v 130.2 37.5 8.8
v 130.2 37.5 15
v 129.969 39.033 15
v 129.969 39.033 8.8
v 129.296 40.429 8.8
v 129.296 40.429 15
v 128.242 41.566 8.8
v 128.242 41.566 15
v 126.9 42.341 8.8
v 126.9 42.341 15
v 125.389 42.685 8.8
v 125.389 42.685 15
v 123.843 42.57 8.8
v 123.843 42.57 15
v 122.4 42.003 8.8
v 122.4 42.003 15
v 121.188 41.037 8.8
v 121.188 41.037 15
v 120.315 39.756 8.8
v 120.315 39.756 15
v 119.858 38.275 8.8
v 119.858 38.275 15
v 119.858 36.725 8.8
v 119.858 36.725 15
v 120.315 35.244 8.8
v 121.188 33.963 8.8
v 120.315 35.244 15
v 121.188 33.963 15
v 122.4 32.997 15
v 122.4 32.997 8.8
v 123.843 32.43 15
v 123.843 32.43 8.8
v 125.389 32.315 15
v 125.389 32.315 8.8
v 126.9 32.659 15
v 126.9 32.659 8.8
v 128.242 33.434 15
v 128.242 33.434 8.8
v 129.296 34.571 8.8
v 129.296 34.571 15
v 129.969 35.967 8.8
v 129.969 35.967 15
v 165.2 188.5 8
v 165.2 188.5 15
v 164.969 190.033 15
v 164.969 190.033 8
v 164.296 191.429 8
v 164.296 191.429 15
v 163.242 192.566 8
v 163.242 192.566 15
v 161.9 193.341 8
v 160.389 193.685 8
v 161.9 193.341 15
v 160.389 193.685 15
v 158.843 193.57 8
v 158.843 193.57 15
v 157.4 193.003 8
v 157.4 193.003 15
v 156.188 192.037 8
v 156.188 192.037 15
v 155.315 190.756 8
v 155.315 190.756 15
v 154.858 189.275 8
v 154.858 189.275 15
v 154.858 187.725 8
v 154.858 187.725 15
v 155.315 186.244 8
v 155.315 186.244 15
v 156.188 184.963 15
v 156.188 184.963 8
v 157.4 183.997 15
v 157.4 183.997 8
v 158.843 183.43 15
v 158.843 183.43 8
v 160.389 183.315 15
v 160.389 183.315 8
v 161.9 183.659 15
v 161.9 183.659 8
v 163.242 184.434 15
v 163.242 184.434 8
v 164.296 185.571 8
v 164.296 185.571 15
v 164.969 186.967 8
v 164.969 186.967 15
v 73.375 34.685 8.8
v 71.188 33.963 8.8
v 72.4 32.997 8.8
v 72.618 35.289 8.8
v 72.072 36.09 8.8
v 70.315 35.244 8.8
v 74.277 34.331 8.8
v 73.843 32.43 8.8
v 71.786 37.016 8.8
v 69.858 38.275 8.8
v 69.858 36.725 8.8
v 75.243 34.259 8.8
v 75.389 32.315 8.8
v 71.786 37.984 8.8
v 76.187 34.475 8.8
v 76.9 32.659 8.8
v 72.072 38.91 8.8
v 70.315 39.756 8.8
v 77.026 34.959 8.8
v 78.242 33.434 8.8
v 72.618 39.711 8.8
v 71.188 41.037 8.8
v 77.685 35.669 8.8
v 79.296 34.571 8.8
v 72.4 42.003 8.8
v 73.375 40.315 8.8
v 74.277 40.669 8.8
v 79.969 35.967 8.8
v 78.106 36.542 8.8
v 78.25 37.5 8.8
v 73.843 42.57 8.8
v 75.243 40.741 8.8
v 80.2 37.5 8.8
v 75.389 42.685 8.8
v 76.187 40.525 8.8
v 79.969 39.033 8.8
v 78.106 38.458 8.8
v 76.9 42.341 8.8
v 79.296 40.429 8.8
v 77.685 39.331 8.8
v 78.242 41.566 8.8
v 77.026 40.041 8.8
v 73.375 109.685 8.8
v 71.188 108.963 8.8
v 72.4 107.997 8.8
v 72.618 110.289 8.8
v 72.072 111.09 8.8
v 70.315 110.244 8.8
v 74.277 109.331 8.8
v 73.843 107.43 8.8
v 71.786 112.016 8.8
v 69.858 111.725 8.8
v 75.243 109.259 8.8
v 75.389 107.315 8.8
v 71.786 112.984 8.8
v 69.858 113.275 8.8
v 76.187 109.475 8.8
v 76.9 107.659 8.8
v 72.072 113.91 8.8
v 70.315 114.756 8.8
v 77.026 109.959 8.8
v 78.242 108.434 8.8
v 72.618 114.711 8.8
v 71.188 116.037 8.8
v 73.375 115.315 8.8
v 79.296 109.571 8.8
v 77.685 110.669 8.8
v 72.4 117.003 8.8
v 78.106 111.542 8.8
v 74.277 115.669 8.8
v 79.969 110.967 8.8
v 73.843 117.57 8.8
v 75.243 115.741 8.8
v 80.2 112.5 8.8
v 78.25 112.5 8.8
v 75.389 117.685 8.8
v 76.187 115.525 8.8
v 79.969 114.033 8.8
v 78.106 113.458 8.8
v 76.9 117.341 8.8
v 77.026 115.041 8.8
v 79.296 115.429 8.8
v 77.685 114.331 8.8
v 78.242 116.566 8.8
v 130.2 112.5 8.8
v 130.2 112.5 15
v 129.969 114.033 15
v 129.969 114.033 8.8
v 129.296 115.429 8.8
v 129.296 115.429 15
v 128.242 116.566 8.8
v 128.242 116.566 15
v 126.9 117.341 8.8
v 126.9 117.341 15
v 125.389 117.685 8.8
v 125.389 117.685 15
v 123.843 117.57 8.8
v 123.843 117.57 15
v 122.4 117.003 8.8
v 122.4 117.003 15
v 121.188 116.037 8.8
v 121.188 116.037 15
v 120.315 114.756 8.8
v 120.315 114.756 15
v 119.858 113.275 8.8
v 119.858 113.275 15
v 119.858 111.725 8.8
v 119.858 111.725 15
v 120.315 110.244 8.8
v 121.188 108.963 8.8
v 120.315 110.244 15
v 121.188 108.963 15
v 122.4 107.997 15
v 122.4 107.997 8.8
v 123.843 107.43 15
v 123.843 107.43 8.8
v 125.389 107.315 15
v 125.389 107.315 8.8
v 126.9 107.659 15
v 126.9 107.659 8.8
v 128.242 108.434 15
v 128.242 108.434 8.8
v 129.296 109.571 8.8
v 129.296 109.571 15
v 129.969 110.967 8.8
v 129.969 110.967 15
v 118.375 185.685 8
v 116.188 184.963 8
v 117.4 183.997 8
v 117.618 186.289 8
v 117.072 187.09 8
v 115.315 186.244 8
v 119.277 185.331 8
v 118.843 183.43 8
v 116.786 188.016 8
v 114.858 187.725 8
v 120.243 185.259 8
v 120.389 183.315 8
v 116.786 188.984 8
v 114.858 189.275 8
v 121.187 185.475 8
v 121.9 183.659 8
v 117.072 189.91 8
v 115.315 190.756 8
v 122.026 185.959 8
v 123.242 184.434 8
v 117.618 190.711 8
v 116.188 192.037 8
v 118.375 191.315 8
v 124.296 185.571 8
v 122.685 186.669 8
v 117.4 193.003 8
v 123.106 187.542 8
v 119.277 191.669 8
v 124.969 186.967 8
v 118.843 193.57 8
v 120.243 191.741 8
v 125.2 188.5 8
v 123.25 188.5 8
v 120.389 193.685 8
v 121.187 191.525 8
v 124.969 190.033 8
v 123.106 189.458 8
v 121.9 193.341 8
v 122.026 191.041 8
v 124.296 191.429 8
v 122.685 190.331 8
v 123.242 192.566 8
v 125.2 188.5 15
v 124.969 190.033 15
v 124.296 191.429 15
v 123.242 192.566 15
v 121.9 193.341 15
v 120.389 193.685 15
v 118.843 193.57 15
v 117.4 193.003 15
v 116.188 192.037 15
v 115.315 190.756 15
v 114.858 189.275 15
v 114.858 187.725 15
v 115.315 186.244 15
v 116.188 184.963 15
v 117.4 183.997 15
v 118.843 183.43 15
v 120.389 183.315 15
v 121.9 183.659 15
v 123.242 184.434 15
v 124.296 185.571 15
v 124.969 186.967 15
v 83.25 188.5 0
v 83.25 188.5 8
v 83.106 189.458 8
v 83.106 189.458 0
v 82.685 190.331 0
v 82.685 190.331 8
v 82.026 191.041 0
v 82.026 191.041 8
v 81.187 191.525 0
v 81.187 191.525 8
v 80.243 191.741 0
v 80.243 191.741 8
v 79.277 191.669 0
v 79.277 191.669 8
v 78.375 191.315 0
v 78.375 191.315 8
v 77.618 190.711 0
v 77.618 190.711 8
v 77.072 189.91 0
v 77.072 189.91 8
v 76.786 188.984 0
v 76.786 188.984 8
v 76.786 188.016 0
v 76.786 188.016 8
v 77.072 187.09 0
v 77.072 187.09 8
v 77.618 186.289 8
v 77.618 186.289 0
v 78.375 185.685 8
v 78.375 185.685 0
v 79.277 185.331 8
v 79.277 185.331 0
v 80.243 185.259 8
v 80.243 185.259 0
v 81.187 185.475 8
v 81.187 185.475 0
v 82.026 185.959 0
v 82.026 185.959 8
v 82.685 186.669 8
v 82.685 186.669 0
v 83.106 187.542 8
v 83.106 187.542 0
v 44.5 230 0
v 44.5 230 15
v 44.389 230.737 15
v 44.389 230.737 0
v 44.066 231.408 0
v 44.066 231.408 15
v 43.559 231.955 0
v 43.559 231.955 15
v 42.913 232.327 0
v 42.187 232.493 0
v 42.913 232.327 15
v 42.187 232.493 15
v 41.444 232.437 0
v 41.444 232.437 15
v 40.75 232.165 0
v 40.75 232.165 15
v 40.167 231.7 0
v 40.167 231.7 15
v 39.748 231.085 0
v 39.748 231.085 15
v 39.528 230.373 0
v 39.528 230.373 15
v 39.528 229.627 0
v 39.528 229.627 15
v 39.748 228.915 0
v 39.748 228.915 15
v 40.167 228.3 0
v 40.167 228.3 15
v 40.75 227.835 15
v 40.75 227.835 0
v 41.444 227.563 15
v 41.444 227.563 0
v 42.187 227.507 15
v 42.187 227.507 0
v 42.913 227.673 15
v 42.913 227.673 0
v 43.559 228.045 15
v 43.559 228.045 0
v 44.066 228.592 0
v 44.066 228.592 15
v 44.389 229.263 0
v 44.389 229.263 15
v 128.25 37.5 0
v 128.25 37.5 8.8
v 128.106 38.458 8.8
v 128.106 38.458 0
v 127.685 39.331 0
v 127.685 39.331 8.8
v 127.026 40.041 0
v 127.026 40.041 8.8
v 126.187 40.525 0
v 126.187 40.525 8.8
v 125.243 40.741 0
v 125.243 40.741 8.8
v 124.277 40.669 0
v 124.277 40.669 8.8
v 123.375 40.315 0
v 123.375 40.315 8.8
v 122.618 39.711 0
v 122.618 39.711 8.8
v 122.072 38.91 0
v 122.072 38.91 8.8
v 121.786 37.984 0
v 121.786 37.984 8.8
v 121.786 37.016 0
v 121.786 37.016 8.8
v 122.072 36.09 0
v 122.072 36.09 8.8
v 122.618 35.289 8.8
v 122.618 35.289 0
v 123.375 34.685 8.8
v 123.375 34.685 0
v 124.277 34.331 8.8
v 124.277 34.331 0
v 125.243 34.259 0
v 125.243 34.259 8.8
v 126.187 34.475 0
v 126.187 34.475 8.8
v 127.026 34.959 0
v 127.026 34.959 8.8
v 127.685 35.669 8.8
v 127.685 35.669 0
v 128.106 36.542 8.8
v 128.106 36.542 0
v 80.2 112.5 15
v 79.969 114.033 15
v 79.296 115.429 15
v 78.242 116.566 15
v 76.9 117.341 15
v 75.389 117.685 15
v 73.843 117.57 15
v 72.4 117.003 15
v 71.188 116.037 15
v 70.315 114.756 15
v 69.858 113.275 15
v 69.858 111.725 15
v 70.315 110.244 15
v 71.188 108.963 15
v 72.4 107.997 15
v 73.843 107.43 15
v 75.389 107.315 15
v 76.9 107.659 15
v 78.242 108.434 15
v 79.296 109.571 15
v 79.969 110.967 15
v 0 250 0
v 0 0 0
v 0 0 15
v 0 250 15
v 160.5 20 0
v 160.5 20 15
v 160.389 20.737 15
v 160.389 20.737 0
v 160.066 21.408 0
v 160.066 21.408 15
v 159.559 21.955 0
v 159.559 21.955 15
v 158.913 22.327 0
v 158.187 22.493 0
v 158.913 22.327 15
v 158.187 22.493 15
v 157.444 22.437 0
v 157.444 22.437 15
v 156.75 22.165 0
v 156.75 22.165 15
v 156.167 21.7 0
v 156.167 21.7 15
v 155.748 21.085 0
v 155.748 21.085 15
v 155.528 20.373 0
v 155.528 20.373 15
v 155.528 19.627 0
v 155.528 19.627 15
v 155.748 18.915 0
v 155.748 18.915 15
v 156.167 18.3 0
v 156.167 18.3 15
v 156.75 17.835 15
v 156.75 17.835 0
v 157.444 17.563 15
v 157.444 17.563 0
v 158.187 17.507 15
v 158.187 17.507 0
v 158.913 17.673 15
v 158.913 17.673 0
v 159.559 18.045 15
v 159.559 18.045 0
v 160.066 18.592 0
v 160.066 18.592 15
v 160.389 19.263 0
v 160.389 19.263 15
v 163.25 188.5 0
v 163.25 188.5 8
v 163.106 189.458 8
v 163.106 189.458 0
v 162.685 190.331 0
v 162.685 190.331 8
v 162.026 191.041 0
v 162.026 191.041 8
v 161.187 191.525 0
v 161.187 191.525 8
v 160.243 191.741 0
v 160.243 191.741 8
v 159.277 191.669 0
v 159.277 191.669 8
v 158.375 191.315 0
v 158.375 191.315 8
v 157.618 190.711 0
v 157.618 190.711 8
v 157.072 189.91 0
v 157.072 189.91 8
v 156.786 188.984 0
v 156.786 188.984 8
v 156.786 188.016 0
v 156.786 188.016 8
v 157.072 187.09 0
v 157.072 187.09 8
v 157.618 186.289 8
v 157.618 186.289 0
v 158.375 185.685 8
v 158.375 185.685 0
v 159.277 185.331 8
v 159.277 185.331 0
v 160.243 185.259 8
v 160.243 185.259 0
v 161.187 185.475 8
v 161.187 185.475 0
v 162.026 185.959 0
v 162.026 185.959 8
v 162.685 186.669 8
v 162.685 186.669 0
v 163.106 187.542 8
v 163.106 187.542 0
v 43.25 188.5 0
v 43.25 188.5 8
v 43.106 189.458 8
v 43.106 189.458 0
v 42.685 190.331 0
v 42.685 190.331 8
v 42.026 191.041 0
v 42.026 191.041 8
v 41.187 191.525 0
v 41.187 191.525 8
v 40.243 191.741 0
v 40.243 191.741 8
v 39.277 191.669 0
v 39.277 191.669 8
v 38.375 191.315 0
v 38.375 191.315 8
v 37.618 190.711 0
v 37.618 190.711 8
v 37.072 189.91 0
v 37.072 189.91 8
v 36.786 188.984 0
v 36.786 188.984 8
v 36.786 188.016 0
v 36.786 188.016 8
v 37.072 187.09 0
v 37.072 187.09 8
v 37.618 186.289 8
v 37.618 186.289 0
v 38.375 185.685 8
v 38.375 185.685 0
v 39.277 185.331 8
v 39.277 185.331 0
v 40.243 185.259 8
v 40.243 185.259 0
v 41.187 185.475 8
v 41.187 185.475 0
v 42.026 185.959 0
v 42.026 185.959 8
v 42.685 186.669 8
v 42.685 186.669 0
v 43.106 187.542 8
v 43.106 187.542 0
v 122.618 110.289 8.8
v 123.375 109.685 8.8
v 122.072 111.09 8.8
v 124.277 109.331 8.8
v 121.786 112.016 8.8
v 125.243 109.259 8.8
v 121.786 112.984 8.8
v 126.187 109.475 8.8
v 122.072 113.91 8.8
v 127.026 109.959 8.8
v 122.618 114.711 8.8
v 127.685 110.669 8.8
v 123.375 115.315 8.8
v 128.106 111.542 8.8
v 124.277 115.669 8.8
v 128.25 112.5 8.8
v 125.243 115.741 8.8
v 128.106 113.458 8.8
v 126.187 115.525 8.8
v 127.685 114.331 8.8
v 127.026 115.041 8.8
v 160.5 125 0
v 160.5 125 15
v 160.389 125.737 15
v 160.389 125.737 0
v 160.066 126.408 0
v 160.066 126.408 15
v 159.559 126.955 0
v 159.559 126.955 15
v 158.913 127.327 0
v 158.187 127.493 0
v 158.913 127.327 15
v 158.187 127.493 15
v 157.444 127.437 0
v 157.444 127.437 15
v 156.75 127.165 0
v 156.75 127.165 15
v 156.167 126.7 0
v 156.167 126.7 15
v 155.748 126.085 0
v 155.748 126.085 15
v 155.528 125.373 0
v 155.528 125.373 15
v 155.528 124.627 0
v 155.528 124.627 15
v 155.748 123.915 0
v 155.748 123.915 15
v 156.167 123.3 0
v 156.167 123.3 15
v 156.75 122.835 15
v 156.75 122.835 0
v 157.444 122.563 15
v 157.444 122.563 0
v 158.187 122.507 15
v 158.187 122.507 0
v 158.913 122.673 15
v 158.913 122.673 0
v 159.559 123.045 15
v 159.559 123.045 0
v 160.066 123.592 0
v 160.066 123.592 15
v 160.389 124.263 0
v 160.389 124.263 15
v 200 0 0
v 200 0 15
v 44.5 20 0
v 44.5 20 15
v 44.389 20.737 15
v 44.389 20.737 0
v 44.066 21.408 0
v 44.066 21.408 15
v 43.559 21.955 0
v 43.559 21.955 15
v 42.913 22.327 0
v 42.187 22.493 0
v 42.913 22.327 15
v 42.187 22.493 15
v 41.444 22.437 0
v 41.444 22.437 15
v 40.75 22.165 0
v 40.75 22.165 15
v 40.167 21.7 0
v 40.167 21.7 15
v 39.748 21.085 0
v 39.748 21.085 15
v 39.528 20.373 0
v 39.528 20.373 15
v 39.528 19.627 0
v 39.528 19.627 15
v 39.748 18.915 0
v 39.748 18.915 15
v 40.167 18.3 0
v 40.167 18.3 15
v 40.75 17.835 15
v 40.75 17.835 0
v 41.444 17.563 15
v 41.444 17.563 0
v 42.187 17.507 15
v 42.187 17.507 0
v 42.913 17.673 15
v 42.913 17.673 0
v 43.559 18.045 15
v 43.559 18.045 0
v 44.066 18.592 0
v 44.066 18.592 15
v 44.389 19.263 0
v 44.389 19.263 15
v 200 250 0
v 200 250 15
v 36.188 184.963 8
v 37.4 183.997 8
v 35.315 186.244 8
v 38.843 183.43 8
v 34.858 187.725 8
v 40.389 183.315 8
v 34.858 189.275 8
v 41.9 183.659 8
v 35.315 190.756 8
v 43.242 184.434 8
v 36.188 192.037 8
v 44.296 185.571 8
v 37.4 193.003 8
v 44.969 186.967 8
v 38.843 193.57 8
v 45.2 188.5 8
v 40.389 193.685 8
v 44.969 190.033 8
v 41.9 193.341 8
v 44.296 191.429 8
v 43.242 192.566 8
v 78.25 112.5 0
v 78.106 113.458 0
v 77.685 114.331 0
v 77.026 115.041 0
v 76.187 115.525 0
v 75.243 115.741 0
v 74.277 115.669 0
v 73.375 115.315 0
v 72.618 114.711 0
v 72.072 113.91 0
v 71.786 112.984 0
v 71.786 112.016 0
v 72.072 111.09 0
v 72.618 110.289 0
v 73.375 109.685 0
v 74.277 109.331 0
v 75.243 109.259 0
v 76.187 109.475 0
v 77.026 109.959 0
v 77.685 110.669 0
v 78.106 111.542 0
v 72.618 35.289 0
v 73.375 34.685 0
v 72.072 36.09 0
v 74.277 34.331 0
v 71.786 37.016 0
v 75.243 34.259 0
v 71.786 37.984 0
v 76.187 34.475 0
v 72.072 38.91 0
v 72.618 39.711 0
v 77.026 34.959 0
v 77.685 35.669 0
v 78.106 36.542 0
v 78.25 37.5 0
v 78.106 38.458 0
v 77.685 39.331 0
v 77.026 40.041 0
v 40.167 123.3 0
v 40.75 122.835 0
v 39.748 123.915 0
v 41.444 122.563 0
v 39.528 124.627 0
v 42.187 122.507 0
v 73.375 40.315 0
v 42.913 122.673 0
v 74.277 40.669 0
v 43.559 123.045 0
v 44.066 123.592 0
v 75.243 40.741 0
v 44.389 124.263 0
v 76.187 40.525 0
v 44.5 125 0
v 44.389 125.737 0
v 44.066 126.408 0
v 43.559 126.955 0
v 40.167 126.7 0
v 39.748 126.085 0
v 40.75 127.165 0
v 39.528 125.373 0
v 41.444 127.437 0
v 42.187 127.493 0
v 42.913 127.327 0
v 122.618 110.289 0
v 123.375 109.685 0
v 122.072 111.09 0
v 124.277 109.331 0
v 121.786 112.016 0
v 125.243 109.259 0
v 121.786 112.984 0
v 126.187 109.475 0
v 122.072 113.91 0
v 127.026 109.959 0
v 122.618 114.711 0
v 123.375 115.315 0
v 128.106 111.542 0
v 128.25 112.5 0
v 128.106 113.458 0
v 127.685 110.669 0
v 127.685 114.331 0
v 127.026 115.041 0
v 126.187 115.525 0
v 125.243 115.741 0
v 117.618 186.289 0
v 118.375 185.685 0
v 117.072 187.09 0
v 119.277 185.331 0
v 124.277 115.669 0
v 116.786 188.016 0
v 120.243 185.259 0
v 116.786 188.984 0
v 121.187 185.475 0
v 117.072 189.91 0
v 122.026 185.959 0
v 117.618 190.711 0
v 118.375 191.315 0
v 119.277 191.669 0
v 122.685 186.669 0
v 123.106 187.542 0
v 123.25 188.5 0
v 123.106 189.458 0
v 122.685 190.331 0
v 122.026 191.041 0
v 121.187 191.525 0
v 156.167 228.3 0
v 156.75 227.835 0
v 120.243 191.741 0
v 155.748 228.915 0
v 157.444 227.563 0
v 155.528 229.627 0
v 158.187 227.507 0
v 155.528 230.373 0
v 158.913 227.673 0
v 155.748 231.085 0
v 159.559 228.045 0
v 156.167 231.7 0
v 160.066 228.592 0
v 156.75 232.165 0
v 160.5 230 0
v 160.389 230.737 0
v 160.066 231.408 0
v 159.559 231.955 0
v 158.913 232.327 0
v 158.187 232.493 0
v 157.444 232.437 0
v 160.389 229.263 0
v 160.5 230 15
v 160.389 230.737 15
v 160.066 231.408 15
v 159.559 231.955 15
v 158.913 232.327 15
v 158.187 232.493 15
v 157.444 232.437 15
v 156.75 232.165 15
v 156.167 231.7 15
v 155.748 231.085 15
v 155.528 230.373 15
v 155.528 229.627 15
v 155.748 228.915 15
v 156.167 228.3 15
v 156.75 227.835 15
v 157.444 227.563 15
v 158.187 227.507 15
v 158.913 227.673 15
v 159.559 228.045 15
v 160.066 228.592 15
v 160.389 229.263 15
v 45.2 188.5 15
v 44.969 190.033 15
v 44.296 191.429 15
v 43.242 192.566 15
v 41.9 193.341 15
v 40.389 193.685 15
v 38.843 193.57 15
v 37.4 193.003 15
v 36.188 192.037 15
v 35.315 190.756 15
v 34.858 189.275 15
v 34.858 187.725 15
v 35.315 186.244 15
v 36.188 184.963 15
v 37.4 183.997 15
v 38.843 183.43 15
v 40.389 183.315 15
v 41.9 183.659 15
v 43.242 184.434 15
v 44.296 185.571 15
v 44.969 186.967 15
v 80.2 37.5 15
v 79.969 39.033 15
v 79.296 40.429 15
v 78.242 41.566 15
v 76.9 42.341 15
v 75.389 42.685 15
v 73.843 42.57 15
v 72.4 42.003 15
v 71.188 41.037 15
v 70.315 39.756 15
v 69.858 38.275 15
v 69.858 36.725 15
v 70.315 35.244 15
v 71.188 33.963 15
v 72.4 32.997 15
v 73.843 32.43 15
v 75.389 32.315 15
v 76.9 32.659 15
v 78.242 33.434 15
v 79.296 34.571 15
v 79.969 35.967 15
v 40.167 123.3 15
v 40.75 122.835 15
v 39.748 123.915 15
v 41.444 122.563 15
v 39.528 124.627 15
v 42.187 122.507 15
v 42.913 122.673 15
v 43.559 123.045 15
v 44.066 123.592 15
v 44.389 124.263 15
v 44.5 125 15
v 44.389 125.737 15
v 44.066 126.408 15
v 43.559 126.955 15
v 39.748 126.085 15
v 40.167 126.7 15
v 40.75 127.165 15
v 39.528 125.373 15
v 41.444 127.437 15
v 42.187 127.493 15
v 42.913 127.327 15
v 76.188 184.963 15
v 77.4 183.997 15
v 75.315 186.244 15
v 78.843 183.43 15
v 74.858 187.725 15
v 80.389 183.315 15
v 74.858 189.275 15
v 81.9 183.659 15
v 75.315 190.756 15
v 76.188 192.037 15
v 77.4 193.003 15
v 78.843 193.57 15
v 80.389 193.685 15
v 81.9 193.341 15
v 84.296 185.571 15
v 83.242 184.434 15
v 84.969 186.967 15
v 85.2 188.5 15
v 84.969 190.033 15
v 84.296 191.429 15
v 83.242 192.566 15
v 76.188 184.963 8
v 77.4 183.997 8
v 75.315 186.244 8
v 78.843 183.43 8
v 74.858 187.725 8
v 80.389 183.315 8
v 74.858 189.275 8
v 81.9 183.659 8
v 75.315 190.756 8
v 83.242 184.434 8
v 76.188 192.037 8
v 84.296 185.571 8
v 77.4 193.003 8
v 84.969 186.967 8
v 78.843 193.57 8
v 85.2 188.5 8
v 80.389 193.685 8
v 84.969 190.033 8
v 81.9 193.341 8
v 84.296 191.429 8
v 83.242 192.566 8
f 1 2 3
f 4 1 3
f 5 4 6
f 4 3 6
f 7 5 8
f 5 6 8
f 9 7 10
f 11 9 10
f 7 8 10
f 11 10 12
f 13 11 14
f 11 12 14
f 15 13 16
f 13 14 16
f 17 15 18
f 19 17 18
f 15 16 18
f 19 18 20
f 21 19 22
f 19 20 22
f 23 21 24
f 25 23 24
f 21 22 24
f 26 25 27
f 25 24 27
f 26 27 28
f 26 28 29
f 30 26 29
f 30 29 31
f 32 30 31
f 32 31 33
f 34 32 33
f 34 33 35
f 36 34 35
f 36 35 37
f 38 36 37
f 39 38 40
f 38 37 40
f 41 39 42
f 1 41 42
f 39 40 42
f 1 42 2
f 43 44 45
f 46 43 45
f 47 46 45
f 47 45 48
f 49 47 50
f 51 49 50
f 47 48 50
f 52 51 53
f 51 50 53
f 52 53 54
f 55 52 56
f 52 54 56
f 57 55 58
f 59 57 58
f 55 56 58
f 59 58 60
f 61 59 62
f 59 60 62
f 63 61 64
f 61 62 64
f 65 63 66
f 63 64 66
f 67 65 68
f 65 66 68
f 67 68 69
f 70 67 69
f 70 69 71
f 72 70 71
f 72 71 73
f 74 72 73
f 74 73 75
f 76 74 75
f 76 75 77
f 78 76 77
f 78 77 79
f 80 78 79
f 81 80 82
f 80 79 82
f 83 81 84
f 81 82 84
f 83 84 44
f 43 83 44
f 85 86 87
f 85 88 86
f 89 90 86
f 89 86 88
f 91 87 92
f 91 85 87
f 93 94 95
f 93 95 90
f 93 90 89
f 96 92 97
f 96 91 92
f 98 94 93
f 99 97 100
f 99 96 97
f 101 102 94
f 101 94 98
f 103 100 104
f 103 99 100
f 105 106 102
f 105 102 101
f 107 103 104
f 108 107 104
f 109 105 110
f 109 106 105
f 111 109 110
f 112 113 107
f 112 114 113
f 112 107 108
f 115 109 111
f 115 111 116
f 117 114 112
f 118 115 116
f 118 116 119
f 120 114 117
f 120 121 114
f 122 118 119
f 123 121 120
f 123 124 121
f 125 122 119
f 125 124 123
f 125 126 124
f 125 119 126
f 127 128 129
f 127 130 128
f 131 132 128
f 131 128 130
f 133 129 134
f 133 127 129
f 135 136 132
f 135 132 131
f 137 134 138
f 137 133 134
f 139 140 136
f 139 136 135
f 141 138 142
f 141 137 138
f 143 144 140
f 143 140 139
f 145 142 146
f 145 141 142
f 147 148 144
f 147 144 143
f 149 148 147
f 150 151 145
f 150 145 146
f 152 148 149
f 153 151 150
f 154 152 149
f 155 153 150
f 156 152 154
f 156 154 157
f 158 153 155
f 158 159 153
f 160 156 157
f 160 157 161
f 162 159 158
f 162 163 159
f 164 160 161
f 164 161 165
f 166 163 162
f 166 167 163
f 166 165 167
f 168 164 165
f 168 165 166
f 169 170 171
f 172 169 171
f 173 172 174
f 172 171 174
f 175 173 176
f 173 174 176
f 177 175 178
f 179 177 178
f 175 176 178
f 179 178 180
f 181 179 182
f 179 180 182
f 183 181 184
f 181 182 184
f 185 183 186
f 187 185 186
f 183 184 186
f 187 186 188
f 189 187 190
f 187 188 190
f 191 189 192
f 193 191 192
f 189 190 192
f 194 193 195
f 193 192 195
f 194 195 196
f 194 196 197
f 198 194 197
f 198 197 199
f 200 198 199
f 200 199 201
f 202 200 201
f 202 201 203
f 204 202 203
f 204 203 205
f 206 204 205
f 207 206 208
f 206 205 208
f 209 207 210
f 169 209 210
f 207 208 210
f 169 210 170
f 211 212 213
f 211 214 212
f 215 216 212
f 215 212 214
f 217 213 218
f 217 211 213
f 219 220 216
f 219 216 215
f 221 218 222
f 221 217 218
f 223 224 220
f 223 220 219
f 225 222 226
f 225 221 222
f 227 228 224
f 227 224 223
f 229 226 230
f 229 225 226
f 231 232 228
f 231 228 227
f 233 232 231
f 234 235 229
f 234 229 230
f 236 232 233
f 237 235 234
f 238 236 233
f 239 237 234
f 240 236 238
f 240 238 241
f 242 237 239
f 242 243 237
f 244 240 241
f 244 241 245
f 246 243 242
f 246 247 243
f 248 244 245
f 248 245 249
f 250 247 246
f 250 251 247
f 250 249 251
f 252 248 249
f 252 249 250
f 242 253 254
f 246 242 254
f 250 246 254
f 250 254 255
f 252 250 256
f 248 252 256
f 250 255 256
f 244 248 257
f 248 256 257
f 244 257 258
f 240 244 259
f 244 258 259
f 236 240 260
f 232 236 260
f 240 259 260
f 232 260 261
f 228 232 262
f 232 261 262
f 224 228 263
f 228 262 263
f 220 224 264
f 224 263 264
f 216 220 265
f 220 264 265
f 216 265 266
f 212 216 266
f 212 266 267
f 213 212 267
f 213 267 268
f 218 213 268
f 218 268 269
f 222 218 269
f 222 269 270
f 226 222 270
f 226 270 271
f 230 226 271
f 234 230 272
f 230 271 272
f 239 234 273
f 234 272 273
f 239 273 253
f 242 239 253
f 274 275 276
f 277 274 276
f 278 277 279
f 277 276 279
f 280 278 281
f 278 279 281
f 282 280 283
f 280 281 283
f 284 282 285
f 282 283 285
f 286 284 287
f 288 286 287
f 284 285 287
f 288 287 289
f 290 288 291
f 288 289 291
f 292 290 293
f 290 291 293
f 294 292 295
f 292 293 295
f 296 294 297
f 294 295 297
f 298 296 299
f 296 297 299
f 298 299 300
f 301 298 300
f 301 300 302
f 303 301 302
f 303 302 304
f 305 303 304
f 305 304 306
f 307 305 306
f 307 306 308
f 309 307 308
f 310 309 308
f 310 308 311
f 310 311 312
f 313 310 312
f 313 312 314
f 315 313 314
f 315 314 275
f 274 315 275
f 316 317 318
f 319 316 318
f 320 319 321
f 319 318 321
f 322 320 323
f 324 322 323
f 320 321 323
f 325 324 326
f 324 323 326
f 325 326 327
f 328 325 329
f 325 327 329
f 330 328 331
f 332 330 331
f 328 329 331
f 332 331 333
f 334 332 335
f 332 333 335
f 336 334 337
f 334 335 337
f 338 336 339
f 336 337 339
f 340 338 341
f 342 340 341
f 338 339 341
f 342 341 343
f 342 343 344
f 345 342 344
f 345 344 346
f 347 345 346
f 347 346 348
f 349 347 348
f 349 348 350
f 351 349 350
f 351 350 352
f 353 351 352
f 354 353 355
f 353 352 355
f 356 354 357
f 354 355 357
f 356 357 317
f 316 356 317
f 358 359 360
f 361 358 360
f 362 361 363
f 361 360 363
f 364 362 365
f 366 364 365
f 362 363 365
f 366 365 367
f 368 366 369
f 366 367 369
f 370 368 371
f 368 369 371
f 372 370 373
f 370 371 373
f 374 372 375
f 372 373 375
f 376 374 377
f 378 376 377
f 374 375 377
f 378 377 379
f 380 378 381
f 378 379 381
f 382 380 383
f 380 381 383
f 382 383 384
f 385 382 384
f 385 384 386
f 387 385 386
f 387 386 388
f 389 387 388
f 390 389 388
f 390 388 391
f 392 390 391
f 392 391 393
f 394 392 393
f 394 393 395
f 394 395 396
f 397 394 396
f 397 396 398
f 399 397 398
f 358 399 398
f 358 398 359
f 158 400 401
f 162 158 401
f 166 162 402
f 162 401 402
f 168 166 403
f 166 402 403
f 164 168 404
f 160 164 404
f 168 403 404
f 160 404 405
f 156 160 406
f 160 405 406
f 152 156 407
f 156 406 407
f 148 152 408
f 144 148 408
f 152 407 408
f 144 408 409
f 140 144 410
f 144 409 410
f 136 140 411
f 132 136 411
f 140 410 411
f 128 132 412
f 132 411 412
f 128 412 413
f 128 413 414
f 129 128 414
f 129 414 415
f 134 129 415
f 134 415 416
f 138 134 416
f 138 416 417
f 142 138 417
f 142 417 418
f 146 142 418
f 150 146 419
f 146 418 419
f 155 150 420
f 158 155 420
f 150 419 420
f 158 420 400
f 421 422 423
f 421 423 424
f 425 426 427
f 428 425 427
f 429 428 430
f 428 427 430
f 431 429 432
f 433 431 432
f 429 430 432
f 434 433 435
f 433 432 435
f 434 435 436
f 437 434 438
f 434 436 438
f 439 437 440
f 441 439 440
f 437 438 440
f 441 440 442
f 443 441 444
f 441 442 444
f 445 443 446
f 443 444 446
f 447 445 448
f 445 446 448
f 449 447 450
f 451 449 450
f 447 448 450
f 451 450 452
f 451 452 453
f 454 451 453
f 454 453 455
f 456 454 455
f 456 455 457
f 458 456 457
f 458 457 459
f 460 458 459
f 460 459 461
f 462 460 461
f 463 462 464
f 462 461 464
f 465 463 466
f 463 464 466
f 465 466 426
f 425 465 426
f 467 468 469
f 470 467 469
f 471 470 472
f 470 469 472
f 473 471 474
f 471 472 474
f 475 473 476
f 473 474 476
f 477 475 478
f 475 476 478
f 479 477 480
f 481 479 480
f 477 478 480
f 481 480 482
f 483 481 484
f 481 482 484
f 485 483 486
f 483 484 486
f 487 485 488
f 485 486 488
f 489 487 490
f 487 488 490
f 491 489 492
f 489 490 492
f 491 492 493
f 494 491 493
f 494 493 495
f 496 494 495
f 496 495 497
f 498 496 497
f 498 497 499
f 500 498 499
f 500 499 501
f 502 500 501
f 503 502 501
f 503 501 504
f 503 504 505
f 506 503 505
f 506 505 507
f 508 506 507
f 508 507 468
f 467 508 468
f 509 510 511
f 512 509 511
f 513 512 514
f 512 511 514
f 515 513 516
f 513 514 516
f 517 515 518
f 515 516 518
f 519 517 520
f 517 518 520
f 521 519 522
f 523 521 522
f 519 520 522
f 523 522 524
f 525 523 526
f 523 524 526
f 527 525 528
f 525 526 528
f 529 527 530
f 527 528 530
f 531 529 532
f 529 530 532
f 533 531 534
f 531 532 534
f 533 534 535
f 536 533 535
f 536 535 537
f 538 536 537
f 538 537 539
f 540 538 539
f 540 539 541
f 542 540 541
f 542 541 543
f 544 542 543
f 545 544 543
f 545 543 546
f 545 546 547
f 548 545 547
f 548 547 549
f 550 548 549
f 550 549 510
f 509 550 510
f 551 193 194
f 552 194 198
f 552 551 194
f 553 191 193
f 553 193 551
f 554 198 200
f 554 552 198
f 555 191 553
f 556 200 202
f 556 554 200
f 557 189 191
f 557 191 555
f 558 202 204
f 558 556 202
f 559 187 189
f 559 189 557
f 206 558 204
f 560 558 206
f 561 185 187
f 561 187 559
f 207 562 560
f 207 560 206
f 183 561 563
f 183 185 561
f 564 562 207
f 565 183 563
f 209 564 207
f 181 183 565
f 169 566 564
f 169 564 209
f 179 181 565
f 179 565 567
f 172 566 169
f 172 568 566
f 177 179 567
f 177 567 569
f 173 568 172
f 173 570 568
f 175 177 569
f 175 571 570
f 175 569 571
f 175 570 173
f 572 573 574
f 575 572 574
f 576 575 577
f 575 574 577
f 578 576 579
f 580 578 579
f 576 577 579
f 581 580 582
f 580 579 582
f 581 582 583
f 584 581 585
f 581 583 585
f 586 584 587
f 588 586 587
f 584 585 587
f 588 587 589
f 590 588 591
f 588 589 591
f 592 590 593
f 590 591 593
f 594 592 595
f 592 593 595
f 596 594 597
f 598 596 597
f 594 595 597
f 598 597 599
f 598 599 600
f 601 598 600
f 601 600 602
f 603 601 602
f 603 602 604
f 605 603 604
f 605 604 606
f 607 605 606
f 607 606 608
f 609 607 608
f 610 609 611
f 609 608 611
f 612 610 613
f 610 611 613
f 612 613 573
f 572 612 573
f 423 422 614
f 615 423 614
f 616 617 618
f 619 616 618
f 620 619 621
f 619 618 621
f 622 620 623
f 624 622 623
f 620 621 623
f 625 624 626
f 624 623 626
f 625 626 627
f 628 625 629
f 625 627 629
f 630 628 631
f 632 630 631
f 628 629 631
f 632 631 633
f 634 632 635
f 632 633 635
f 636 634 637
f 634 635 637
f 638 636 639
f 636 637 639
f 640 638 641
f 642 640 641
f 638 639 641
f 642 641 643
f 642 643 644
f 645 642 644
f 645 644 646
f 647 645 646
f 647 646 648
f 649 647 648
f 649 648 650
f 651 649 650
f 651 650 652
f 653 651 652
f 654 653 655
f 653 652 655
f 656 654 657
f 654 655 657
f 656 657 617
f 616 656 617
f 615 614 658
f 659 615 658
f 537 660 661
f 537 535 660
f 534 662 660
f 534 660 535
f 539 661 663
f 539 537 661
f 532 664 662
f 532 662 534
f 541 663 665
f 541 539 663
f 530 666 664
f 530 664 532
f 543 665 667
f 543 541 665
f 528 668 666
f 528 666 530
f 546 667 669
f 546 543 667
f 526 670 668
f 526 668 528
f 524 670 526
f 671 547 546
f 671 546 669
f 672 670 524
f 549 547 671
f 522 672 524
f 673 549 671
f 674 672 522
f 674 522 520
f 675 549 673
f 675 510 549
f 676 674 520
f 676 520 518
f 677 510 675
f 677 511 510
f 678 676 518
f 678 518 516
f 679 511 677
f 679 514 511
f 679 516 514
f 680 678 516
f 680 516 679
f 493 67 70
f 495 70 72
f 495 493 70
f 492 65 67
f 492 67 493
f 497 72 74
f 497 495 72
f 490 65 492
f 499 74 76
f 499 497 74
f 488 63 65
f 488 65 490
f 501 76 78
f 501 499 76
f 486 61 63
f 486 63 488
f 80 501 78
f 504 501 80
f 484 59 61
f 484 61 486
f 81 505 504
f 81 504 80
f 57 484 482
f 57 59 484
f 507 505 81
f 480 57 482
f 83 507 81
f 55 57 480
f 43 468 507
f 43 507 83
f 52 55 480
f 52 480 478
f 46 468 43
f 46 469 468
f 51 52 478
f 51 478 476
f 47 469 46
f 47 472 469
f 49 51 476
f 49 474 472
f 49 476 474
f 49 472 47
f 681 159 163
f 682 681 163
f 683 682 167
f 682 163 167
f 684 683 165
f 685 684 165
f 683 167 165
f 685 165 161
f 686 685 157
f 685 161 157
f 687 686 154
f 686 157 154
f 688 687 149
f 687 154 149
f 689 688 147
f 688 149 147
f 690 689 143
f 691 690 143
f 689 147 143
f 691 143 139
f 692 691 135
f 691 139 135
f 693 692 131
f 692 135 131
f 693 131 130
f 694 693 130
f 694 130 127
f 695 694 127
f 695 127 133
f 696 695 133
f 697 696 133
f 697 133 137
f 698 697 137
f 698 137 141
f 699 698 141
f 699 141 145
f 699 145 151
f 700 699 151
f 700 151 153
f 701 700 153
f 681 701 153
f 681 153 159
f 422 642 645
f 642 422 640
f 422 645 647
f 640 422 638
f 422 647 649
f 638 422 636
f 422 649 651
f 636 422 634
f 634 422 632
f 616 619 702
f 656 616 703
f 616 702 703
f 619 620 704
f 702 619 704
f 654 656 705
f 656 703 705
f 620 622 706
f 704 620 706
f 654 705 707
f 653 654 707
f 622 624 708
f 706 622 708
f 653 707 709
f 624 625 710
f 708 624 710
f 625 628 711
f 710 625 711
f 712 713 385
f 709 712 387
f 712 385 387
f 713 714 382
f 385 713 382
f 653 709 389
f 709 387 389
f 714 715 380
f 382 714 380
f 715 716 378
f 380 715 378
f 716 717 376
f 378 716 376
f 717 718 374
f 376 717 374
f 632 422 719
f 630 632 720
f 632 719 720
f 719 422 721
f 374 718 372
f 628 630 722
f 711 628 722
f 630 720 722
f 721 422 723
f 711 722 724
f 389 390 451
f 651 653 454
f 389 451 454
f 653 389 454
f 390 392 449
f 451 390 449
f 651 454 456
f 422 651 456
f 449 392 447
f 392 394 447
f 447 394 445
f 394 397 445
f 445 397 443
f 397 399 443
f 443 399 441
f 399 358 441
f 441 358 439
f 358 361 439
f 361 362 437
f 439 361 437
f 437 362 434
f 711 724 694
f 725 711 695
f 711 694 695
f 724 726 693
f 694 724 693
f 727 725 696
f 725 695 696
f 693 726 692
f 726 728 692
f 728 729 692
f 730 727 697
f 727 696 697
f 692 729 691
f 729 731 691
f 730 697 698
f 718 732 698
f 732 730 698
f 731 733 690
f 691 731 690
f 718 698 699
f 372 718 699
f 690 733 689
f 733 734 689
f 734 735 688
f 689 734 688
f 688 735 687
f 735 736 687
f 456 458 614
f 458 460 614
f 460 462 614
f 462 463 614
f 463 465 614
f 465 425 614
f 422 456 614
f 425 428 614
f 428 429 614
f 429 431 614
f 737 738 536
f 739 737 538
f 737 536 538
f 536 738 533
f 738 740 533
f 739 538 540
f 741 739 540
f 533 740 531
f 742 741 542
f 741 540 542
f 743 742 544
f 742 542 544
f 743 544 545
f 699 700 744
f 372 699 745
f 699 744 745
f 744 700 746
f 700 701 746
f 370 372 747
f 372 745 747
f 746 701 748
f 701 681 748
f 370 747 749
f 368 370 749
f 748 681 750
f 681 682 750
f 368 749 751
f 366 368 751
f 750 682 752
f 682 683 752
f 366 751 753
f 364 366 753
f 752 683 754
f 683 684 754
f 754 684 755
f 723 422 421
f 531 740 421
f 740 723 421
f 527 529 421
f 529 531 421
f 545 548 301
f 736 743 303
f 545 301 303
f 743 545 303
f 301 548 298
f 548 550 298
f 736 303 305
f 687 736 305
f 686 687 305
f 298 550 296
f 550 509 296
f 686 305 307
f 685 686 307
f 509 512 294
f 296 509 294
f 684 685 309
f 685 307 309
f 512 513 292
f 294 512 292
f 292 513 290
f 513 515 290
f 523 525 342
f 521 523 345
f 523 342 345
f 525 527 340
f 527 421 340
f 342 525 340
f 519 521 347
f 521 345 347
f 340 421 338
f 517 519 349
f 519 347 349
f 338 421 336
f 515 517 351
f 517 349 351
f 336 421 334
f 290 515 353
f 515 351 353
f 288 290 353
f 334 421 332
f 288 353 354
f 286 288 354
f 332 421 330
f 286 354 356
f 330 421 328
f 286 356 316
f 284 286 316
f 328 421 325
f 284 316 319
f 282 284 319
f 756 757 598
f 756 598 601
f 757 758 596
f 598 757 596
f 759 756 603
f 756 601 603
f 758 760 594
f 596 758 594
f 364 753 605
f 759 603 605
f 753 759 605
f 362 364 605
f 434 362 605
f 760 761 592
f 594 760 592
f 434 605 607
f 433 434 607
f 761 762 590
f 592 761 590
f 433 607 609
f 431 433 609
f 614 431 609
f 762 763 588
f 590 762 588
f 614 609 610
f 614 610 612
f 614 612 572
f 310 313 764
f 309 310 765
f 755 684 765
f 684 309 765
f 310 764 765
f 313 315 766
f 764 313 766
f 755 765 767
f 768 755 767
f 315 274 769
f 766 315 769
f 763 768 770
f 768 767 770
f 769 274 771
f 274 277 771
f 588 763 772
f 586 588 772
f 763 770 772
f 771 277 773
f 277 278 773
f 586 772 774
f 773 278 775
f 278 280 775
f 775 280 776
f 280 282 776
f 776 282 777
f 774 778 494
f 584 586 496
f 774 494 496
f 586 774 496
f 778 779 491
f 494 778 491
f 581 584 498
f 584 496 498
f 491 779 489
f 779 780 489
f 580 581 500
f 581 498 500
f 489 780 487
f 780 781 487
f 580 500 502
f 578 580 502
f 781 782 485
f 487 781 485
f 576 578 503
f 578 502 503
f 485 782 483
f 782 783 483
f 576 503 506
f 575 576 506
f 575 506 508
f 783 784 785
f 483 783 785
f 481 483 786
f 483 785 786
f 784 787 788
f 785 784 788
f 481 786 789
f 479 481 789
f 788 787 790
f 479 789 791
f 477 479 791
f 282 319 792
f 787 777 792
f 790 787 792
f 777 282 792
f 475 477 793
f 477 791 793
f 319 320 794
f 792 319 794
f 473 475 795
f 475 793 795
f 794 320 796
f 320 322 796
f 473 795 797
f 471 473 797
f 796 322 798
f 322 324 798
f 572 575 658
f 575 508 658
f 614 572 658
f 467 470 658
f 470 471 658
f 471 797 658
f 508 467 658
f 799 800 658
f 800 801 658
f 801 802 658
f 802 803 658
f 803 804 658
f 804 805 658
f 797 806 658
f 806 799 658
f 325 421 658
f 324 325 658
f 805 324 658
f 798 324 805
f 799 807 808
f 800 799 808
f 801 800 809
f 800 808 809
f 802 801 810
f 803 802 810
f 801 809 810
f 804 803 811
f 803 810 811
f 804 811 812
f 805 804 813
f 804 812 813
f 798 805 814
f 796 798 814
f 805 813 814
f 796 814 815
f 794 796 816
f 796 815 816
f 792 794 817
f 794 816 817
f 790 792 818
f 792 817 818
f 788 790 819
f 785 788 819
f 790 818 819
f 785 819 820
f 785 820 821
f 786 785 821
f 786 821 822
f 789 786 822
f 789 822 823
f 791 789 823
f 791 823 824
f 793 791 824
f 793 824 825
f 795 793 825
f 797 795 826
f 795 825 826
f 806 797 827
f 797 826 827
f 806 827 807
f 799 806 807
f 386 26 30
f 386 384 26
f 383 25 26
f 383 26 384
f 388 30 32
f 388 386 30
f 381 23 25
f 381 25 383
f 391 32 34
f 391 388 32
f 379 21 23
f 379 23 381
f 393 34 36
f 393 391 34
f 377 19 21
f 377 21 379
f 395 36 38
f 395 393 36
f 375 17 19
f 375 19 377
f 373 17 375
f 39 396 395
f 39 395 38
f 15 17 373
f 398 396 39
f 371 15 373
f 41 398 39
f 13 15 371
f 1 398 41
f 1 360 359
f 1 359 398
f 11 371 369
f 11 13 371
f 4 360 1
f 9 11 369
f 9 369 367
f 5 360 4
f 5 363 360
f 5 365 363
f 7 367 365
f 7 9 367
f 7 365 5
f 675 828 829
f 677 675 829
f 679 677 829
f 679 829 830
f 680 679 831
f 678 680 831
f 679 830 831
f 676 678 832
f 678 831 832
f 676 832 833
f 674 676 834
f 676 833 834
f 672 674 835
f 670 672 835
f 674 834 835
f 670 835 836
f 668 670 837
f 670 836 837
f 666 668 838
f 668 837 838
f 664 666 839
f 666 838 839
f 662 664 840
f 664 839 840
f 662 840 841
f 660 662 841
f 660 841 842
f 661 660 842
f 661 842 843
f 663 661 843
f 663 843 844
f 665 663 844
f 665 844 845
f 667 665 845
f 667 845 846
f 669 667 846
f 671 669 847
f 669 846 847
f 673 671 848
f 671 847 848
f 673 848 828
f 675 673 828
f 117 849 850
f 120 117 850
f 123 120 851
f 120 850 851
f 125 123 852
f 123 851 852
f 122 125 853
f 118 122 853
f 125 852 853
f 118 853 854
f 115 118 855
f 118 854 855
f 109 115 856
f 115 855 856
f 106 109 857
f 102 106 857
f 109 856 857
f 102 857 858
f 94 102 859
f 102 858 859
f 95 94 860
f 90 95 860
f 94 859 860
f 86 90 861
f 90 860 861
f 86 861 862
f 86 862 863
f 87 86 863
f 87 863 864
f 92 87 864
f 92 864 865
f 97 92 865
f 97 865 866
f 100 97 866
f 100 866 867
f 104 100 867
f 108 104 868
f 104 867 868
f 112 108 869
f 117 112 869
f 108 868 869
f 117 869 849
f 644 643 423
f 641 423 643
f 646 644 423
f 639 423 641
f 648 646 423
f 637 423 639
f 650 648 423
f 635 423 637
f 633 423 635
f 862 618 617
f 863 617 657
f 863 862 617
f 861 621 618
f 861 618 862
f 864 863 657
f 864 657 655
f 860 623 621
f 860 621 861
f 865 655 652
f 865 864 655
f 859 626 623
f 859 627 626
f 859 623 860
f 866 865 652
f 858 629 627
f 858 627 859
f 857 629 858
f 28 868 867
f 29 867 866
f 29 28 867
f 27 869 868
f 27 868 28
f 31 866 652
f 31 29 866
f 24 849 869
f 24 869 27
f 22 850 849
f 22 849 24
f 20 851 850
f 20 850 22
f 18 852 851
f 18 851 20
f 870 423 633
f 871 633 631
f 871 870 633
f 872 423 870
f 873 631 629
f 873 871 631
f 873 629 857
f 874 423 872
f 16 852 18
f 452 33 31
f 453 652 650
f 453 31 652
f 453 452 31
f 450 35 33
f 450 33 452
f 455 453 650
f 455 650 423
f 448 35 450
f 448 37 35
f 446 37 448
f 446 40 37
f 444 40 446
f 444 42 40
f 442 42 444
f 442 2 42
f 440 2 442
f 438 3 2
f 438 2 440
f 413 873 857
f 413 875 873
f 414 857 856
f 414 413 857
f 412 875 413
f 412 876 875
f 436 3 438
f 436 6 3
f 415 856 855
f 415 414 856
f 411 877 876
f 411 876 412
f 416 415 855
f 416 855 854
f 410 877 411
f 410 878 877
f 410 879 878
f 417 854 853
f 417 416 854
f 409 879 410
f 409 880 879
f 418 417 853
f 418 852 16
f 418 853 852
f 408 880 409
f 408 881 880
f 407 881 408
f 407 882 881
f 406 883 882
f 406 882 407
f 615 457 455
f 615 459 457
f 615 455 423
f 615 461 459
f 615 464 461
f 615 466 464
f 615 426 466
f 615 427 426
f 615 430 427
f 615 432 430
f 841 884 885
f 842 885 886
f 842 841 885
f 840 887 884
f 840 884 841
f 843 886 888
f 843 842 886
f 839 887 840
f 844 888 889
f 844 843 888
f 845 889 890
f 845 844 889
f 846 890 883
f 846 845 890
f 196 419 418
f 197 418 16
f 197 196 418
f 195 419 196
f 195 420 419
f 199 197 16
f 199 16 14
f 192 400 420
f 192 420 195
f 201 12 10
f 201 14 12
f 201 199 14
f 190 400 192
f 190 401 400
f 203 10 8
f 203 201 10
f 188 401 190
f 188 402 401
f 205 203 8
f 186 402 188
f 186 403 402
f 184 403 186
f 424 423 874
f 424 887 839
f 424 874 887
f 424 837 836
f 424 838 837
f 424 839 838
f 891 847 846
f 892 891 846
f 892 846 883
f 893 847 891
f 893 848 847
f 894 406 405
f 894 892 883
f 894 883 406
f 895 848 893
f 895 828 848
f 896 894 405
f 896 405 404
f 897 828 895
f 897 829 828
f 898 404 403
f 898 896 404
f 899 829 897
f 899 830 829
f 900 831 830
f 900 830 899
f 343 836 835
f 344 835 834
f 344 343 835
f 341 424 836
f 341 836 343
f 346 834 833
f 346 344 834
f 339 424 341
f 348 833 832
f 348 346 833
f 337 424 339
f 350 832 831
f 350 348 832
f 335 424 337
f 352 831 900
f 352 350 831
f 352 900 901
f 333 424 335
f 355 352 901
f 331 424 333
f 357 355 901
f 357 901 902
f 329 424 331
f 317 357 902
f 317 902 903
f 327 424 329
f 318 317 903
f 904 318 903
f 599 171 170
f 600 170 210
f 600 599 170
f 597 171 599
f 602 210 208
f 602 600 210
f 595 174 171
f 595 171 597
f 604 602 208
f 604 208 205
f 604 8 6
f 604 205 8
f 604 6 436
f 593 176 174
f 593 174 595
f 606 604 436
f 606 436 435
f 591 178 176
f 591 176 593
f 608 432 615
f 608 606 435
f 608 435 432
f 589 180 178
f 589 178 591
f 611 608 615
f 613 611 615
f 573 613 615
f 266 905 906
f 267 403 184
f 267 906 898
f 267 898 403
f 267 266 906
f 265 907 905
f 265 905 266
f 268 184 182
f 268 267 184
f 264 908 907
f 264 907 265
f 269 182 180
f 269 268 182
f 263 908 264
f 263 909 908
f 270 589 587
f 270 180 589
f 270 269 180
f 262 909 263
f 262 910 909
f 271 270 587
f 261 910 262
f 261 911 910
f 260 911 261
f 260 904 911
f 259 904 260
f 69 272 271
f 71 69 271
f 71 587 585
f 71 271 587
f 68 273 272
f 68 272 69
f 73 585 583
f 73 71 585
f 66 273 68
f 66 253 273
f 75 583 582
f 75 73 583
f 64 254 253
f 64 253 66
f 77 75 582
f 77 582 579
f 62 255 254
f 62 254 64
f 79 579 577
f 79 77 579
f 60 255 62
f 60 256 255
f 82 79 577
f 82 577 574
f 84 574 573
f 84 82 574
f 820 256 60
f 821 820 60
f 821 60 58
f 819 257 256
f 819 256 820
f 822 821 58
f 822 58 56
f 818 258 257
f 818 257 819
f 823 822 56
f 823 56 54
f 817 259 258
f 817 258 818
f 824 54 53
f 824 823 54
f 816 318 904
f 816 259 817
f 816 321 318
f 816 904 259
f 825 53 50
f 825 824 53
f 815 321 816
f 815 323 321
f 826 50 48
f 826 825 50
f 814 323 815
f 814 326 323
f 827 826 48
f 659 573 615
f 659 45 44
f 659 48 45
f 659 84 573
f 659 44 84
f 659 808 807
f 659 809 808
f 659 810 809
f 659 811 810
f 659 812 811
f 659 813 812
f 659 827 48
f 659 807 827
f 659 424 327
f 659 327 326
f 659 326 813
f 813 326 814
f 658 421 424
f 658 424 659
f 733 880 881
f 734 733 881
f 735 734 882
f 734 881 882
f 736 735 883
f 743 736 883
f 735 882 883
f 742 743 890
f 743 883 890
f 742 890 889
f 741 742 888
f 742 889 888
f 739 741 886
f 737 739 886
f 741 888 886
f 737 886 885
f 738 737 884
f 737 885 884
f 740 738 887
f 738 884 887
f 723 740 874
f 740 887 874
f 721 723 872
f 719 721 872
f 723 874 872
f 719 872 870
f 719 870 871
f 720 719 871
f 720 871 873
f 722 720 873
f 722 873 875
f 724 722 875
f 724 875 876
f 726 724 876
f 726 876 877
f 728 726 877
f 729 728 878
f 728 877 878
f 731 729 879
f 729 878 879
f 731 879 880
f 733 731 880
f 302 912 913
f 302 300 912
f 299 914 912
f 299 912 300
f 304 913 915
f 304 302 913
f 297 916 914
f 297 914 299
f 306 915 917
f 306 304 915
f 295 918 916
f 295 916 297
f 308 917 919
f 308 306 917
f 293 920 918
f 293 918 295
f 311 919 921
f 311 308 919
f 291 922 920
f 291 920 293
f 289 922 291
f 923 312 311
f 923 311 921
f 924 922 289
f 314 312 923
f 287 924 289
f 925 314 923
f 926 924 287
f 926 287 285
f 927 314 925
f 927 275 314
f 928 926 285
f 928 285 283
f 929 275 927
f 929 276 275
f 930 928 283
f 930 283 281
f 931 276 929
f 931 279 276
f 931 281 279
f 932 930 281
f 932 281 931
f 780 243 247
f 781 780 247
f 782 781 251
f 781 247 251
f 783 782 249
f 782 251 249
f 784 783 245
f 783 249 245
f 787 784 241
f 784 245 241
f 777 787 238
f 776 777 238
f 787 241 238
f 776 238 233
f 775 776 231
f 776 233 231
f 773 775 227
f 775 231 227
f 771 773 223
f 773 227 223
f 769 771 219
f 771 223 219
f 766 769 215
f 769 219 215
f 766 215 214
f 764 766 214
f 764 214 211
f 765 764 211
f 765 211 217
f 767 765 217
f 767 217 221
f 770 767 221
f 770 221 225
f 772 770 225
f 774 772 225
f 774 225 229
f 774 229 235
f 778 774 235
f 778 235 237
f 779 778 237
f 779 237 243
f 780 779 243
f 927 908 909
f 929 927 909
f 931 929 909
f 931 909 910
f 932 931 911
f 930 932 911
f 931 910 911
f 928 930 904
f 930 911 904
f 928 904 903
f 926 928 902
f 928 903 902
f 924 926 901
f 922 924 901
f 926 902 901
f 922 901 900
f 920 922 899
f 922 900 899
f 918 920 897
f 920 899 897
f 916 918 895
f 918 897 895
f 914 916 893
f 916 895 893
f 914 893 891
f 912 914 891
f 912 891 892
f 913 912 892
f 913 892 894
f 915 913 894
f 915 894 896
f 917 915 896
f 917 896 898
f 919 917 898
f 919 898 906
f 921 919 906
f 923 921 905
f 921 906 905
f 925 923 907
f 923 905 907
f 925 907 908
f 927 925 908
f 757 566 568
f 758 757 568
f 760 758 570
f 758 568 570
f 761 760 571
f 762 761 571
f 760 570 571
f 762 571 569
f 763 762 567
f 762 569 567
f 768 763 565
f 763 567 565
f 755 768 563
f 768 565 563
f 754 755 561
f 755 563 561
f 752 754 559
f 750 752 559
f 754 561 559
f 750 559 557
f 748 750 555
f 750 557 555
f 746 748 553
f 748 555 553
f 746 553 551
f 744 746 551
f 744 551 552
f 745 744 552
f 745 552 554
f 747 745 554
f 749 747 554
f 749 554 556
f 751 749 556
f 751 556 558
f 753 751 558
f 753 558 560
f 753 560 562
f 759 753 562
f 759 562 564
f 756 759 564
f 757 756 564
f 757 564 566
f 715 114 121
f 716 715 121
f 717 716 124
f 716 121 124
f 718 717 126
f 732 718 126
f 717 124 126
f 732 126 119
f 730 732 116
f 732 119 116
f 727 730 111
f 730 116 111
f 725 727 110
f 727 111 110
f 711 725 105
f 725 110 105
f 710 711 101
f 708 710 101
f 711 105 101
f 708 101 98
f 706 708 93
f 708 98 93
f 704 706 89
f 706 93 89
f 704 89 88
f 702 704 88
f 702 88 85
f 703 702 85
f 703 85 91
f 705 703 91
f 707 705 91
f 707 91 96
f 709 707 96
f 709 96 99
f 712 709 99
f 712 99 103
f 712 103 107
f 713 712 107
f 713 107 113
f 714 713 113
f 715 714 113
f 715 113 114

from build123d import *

# Parameters (mm, degrees)
SKETCH_W        = 200
SKETCH_H        = 250
PAD_DEPTH       = 15
SKETCH001_R     = 3.25
POCKET_DEPTH    = 15
SKETCH002_R     = 5.2
POCKET001_DEPTH = 6.2
SKETCH003_R     = 2.5
POCKET002_DEPTH = 15
SKETCH004_R     = 3.25
POCKET003_DEPTH = 15
SKETCH005_R     = 5.2
POCKET004_DEPTH = 7


with BuildPart() as part:
    # Sketch → Pad (new body)
    with BuildSketch(Plane.XY):
        with Locations((100, 125)):
            Rectangle(SKETCH_W, SKETCH_H)
    extrude(amount=PAD_DEPTH)

    # Sketch001 (on Face6 of Pad) → Pocket (cut)
    with BuildSketch(Plane.XY.offset(15)):
        with Locations((125, 37.5)):
            Circle(SKETCH001_R)
        with Locations((75, 37.5)):
            Circle(SKETCH001_R)
        with Locations((125, 112.5)):
            Circle(SKETCH001_R)
        with Locations((75, 112.5)):
            Circle(SKETCH001_R)
    extrude(amount=-POCKET_DEPTH, mode=Mode.SUBTRACT)

    # Sketch002 (on Face5 of Pocket) → Pocket001 (cut)
    with BuildSketch(Plane.XY.offset(15)):
        with Locations((75, 112.5)):
            Circle(SKETCH002_R)
        with Locations((125, 112.5)):
            Circle(SKETCH002_R)
        with Locations((75, 37.5)):
            Circle(SKETCH002_R)
        with Locations((125, 37.5)):
            Circle(SKETCH002_R)
    extrude(amount=-POCKET001_DEPTH, mode=Mode.SUBTRACT)

    # Sketch003 (on Face5 of Pocket001) → Pocket002 (cut)
    with BuildSketch(Plane.XY.offset(15)):
        with Locations((42, 230)):
            Circle(SKETCH003_R)
        with Locations((42, 125)):
            Circle(SKETCH003_R)
        with Locations((42, 20)):
            Circle(SKETCH003_R)
        with Locations((158, 230)):
            Circle(SKETCH003_R)
        with Locations((158, 125)):
            Circle(SKETCH003_R)
        with Locations((158, 20)):
            Circle(SKETCH003_R)
    extrude(amount=-POCKET002_DEPTH, mode=Mode.SUBTRACT)

    # Sketch004 (on Face5 of Pocket002) → Pocket003 (cut)
    with BuildSketch(Plane.XY.offset(15)):
        with Locations((40, 188.5)):
            Circle(SKETCH004_R)
        with Locations((80, 188.5)):
            Circle(SKETCH004_R)
        with Locations((120, 188.5)):
            Circle(SKETCH004_R)
        with Locations((160, 188.5)):
            Circle(SKETCH004_R)
    extrude(amount=-POCKET003_DEPTH, mode=Mode.SUBTRACT)

    # Sketch005 (on Face5 of Pocket003) → Pocket004 (cut)
    with BuildSketch(Plane.XY.offset(15)):
        with Locations((40, 188.5)):
            Circle(SKETCH005_R)
        with Locations((80, 188.5)):
            Circle(SKETCH005_R)
        with Locations((120, 188.5)):
            Circle(SKETCH005_R)
        with Locations((160, 188.5)):
            Circle(SKETCH005_R)
    extrude(amount=-POCKET004_DEPTH, mode=Mode.SUBTRACT)


solid = part.part
